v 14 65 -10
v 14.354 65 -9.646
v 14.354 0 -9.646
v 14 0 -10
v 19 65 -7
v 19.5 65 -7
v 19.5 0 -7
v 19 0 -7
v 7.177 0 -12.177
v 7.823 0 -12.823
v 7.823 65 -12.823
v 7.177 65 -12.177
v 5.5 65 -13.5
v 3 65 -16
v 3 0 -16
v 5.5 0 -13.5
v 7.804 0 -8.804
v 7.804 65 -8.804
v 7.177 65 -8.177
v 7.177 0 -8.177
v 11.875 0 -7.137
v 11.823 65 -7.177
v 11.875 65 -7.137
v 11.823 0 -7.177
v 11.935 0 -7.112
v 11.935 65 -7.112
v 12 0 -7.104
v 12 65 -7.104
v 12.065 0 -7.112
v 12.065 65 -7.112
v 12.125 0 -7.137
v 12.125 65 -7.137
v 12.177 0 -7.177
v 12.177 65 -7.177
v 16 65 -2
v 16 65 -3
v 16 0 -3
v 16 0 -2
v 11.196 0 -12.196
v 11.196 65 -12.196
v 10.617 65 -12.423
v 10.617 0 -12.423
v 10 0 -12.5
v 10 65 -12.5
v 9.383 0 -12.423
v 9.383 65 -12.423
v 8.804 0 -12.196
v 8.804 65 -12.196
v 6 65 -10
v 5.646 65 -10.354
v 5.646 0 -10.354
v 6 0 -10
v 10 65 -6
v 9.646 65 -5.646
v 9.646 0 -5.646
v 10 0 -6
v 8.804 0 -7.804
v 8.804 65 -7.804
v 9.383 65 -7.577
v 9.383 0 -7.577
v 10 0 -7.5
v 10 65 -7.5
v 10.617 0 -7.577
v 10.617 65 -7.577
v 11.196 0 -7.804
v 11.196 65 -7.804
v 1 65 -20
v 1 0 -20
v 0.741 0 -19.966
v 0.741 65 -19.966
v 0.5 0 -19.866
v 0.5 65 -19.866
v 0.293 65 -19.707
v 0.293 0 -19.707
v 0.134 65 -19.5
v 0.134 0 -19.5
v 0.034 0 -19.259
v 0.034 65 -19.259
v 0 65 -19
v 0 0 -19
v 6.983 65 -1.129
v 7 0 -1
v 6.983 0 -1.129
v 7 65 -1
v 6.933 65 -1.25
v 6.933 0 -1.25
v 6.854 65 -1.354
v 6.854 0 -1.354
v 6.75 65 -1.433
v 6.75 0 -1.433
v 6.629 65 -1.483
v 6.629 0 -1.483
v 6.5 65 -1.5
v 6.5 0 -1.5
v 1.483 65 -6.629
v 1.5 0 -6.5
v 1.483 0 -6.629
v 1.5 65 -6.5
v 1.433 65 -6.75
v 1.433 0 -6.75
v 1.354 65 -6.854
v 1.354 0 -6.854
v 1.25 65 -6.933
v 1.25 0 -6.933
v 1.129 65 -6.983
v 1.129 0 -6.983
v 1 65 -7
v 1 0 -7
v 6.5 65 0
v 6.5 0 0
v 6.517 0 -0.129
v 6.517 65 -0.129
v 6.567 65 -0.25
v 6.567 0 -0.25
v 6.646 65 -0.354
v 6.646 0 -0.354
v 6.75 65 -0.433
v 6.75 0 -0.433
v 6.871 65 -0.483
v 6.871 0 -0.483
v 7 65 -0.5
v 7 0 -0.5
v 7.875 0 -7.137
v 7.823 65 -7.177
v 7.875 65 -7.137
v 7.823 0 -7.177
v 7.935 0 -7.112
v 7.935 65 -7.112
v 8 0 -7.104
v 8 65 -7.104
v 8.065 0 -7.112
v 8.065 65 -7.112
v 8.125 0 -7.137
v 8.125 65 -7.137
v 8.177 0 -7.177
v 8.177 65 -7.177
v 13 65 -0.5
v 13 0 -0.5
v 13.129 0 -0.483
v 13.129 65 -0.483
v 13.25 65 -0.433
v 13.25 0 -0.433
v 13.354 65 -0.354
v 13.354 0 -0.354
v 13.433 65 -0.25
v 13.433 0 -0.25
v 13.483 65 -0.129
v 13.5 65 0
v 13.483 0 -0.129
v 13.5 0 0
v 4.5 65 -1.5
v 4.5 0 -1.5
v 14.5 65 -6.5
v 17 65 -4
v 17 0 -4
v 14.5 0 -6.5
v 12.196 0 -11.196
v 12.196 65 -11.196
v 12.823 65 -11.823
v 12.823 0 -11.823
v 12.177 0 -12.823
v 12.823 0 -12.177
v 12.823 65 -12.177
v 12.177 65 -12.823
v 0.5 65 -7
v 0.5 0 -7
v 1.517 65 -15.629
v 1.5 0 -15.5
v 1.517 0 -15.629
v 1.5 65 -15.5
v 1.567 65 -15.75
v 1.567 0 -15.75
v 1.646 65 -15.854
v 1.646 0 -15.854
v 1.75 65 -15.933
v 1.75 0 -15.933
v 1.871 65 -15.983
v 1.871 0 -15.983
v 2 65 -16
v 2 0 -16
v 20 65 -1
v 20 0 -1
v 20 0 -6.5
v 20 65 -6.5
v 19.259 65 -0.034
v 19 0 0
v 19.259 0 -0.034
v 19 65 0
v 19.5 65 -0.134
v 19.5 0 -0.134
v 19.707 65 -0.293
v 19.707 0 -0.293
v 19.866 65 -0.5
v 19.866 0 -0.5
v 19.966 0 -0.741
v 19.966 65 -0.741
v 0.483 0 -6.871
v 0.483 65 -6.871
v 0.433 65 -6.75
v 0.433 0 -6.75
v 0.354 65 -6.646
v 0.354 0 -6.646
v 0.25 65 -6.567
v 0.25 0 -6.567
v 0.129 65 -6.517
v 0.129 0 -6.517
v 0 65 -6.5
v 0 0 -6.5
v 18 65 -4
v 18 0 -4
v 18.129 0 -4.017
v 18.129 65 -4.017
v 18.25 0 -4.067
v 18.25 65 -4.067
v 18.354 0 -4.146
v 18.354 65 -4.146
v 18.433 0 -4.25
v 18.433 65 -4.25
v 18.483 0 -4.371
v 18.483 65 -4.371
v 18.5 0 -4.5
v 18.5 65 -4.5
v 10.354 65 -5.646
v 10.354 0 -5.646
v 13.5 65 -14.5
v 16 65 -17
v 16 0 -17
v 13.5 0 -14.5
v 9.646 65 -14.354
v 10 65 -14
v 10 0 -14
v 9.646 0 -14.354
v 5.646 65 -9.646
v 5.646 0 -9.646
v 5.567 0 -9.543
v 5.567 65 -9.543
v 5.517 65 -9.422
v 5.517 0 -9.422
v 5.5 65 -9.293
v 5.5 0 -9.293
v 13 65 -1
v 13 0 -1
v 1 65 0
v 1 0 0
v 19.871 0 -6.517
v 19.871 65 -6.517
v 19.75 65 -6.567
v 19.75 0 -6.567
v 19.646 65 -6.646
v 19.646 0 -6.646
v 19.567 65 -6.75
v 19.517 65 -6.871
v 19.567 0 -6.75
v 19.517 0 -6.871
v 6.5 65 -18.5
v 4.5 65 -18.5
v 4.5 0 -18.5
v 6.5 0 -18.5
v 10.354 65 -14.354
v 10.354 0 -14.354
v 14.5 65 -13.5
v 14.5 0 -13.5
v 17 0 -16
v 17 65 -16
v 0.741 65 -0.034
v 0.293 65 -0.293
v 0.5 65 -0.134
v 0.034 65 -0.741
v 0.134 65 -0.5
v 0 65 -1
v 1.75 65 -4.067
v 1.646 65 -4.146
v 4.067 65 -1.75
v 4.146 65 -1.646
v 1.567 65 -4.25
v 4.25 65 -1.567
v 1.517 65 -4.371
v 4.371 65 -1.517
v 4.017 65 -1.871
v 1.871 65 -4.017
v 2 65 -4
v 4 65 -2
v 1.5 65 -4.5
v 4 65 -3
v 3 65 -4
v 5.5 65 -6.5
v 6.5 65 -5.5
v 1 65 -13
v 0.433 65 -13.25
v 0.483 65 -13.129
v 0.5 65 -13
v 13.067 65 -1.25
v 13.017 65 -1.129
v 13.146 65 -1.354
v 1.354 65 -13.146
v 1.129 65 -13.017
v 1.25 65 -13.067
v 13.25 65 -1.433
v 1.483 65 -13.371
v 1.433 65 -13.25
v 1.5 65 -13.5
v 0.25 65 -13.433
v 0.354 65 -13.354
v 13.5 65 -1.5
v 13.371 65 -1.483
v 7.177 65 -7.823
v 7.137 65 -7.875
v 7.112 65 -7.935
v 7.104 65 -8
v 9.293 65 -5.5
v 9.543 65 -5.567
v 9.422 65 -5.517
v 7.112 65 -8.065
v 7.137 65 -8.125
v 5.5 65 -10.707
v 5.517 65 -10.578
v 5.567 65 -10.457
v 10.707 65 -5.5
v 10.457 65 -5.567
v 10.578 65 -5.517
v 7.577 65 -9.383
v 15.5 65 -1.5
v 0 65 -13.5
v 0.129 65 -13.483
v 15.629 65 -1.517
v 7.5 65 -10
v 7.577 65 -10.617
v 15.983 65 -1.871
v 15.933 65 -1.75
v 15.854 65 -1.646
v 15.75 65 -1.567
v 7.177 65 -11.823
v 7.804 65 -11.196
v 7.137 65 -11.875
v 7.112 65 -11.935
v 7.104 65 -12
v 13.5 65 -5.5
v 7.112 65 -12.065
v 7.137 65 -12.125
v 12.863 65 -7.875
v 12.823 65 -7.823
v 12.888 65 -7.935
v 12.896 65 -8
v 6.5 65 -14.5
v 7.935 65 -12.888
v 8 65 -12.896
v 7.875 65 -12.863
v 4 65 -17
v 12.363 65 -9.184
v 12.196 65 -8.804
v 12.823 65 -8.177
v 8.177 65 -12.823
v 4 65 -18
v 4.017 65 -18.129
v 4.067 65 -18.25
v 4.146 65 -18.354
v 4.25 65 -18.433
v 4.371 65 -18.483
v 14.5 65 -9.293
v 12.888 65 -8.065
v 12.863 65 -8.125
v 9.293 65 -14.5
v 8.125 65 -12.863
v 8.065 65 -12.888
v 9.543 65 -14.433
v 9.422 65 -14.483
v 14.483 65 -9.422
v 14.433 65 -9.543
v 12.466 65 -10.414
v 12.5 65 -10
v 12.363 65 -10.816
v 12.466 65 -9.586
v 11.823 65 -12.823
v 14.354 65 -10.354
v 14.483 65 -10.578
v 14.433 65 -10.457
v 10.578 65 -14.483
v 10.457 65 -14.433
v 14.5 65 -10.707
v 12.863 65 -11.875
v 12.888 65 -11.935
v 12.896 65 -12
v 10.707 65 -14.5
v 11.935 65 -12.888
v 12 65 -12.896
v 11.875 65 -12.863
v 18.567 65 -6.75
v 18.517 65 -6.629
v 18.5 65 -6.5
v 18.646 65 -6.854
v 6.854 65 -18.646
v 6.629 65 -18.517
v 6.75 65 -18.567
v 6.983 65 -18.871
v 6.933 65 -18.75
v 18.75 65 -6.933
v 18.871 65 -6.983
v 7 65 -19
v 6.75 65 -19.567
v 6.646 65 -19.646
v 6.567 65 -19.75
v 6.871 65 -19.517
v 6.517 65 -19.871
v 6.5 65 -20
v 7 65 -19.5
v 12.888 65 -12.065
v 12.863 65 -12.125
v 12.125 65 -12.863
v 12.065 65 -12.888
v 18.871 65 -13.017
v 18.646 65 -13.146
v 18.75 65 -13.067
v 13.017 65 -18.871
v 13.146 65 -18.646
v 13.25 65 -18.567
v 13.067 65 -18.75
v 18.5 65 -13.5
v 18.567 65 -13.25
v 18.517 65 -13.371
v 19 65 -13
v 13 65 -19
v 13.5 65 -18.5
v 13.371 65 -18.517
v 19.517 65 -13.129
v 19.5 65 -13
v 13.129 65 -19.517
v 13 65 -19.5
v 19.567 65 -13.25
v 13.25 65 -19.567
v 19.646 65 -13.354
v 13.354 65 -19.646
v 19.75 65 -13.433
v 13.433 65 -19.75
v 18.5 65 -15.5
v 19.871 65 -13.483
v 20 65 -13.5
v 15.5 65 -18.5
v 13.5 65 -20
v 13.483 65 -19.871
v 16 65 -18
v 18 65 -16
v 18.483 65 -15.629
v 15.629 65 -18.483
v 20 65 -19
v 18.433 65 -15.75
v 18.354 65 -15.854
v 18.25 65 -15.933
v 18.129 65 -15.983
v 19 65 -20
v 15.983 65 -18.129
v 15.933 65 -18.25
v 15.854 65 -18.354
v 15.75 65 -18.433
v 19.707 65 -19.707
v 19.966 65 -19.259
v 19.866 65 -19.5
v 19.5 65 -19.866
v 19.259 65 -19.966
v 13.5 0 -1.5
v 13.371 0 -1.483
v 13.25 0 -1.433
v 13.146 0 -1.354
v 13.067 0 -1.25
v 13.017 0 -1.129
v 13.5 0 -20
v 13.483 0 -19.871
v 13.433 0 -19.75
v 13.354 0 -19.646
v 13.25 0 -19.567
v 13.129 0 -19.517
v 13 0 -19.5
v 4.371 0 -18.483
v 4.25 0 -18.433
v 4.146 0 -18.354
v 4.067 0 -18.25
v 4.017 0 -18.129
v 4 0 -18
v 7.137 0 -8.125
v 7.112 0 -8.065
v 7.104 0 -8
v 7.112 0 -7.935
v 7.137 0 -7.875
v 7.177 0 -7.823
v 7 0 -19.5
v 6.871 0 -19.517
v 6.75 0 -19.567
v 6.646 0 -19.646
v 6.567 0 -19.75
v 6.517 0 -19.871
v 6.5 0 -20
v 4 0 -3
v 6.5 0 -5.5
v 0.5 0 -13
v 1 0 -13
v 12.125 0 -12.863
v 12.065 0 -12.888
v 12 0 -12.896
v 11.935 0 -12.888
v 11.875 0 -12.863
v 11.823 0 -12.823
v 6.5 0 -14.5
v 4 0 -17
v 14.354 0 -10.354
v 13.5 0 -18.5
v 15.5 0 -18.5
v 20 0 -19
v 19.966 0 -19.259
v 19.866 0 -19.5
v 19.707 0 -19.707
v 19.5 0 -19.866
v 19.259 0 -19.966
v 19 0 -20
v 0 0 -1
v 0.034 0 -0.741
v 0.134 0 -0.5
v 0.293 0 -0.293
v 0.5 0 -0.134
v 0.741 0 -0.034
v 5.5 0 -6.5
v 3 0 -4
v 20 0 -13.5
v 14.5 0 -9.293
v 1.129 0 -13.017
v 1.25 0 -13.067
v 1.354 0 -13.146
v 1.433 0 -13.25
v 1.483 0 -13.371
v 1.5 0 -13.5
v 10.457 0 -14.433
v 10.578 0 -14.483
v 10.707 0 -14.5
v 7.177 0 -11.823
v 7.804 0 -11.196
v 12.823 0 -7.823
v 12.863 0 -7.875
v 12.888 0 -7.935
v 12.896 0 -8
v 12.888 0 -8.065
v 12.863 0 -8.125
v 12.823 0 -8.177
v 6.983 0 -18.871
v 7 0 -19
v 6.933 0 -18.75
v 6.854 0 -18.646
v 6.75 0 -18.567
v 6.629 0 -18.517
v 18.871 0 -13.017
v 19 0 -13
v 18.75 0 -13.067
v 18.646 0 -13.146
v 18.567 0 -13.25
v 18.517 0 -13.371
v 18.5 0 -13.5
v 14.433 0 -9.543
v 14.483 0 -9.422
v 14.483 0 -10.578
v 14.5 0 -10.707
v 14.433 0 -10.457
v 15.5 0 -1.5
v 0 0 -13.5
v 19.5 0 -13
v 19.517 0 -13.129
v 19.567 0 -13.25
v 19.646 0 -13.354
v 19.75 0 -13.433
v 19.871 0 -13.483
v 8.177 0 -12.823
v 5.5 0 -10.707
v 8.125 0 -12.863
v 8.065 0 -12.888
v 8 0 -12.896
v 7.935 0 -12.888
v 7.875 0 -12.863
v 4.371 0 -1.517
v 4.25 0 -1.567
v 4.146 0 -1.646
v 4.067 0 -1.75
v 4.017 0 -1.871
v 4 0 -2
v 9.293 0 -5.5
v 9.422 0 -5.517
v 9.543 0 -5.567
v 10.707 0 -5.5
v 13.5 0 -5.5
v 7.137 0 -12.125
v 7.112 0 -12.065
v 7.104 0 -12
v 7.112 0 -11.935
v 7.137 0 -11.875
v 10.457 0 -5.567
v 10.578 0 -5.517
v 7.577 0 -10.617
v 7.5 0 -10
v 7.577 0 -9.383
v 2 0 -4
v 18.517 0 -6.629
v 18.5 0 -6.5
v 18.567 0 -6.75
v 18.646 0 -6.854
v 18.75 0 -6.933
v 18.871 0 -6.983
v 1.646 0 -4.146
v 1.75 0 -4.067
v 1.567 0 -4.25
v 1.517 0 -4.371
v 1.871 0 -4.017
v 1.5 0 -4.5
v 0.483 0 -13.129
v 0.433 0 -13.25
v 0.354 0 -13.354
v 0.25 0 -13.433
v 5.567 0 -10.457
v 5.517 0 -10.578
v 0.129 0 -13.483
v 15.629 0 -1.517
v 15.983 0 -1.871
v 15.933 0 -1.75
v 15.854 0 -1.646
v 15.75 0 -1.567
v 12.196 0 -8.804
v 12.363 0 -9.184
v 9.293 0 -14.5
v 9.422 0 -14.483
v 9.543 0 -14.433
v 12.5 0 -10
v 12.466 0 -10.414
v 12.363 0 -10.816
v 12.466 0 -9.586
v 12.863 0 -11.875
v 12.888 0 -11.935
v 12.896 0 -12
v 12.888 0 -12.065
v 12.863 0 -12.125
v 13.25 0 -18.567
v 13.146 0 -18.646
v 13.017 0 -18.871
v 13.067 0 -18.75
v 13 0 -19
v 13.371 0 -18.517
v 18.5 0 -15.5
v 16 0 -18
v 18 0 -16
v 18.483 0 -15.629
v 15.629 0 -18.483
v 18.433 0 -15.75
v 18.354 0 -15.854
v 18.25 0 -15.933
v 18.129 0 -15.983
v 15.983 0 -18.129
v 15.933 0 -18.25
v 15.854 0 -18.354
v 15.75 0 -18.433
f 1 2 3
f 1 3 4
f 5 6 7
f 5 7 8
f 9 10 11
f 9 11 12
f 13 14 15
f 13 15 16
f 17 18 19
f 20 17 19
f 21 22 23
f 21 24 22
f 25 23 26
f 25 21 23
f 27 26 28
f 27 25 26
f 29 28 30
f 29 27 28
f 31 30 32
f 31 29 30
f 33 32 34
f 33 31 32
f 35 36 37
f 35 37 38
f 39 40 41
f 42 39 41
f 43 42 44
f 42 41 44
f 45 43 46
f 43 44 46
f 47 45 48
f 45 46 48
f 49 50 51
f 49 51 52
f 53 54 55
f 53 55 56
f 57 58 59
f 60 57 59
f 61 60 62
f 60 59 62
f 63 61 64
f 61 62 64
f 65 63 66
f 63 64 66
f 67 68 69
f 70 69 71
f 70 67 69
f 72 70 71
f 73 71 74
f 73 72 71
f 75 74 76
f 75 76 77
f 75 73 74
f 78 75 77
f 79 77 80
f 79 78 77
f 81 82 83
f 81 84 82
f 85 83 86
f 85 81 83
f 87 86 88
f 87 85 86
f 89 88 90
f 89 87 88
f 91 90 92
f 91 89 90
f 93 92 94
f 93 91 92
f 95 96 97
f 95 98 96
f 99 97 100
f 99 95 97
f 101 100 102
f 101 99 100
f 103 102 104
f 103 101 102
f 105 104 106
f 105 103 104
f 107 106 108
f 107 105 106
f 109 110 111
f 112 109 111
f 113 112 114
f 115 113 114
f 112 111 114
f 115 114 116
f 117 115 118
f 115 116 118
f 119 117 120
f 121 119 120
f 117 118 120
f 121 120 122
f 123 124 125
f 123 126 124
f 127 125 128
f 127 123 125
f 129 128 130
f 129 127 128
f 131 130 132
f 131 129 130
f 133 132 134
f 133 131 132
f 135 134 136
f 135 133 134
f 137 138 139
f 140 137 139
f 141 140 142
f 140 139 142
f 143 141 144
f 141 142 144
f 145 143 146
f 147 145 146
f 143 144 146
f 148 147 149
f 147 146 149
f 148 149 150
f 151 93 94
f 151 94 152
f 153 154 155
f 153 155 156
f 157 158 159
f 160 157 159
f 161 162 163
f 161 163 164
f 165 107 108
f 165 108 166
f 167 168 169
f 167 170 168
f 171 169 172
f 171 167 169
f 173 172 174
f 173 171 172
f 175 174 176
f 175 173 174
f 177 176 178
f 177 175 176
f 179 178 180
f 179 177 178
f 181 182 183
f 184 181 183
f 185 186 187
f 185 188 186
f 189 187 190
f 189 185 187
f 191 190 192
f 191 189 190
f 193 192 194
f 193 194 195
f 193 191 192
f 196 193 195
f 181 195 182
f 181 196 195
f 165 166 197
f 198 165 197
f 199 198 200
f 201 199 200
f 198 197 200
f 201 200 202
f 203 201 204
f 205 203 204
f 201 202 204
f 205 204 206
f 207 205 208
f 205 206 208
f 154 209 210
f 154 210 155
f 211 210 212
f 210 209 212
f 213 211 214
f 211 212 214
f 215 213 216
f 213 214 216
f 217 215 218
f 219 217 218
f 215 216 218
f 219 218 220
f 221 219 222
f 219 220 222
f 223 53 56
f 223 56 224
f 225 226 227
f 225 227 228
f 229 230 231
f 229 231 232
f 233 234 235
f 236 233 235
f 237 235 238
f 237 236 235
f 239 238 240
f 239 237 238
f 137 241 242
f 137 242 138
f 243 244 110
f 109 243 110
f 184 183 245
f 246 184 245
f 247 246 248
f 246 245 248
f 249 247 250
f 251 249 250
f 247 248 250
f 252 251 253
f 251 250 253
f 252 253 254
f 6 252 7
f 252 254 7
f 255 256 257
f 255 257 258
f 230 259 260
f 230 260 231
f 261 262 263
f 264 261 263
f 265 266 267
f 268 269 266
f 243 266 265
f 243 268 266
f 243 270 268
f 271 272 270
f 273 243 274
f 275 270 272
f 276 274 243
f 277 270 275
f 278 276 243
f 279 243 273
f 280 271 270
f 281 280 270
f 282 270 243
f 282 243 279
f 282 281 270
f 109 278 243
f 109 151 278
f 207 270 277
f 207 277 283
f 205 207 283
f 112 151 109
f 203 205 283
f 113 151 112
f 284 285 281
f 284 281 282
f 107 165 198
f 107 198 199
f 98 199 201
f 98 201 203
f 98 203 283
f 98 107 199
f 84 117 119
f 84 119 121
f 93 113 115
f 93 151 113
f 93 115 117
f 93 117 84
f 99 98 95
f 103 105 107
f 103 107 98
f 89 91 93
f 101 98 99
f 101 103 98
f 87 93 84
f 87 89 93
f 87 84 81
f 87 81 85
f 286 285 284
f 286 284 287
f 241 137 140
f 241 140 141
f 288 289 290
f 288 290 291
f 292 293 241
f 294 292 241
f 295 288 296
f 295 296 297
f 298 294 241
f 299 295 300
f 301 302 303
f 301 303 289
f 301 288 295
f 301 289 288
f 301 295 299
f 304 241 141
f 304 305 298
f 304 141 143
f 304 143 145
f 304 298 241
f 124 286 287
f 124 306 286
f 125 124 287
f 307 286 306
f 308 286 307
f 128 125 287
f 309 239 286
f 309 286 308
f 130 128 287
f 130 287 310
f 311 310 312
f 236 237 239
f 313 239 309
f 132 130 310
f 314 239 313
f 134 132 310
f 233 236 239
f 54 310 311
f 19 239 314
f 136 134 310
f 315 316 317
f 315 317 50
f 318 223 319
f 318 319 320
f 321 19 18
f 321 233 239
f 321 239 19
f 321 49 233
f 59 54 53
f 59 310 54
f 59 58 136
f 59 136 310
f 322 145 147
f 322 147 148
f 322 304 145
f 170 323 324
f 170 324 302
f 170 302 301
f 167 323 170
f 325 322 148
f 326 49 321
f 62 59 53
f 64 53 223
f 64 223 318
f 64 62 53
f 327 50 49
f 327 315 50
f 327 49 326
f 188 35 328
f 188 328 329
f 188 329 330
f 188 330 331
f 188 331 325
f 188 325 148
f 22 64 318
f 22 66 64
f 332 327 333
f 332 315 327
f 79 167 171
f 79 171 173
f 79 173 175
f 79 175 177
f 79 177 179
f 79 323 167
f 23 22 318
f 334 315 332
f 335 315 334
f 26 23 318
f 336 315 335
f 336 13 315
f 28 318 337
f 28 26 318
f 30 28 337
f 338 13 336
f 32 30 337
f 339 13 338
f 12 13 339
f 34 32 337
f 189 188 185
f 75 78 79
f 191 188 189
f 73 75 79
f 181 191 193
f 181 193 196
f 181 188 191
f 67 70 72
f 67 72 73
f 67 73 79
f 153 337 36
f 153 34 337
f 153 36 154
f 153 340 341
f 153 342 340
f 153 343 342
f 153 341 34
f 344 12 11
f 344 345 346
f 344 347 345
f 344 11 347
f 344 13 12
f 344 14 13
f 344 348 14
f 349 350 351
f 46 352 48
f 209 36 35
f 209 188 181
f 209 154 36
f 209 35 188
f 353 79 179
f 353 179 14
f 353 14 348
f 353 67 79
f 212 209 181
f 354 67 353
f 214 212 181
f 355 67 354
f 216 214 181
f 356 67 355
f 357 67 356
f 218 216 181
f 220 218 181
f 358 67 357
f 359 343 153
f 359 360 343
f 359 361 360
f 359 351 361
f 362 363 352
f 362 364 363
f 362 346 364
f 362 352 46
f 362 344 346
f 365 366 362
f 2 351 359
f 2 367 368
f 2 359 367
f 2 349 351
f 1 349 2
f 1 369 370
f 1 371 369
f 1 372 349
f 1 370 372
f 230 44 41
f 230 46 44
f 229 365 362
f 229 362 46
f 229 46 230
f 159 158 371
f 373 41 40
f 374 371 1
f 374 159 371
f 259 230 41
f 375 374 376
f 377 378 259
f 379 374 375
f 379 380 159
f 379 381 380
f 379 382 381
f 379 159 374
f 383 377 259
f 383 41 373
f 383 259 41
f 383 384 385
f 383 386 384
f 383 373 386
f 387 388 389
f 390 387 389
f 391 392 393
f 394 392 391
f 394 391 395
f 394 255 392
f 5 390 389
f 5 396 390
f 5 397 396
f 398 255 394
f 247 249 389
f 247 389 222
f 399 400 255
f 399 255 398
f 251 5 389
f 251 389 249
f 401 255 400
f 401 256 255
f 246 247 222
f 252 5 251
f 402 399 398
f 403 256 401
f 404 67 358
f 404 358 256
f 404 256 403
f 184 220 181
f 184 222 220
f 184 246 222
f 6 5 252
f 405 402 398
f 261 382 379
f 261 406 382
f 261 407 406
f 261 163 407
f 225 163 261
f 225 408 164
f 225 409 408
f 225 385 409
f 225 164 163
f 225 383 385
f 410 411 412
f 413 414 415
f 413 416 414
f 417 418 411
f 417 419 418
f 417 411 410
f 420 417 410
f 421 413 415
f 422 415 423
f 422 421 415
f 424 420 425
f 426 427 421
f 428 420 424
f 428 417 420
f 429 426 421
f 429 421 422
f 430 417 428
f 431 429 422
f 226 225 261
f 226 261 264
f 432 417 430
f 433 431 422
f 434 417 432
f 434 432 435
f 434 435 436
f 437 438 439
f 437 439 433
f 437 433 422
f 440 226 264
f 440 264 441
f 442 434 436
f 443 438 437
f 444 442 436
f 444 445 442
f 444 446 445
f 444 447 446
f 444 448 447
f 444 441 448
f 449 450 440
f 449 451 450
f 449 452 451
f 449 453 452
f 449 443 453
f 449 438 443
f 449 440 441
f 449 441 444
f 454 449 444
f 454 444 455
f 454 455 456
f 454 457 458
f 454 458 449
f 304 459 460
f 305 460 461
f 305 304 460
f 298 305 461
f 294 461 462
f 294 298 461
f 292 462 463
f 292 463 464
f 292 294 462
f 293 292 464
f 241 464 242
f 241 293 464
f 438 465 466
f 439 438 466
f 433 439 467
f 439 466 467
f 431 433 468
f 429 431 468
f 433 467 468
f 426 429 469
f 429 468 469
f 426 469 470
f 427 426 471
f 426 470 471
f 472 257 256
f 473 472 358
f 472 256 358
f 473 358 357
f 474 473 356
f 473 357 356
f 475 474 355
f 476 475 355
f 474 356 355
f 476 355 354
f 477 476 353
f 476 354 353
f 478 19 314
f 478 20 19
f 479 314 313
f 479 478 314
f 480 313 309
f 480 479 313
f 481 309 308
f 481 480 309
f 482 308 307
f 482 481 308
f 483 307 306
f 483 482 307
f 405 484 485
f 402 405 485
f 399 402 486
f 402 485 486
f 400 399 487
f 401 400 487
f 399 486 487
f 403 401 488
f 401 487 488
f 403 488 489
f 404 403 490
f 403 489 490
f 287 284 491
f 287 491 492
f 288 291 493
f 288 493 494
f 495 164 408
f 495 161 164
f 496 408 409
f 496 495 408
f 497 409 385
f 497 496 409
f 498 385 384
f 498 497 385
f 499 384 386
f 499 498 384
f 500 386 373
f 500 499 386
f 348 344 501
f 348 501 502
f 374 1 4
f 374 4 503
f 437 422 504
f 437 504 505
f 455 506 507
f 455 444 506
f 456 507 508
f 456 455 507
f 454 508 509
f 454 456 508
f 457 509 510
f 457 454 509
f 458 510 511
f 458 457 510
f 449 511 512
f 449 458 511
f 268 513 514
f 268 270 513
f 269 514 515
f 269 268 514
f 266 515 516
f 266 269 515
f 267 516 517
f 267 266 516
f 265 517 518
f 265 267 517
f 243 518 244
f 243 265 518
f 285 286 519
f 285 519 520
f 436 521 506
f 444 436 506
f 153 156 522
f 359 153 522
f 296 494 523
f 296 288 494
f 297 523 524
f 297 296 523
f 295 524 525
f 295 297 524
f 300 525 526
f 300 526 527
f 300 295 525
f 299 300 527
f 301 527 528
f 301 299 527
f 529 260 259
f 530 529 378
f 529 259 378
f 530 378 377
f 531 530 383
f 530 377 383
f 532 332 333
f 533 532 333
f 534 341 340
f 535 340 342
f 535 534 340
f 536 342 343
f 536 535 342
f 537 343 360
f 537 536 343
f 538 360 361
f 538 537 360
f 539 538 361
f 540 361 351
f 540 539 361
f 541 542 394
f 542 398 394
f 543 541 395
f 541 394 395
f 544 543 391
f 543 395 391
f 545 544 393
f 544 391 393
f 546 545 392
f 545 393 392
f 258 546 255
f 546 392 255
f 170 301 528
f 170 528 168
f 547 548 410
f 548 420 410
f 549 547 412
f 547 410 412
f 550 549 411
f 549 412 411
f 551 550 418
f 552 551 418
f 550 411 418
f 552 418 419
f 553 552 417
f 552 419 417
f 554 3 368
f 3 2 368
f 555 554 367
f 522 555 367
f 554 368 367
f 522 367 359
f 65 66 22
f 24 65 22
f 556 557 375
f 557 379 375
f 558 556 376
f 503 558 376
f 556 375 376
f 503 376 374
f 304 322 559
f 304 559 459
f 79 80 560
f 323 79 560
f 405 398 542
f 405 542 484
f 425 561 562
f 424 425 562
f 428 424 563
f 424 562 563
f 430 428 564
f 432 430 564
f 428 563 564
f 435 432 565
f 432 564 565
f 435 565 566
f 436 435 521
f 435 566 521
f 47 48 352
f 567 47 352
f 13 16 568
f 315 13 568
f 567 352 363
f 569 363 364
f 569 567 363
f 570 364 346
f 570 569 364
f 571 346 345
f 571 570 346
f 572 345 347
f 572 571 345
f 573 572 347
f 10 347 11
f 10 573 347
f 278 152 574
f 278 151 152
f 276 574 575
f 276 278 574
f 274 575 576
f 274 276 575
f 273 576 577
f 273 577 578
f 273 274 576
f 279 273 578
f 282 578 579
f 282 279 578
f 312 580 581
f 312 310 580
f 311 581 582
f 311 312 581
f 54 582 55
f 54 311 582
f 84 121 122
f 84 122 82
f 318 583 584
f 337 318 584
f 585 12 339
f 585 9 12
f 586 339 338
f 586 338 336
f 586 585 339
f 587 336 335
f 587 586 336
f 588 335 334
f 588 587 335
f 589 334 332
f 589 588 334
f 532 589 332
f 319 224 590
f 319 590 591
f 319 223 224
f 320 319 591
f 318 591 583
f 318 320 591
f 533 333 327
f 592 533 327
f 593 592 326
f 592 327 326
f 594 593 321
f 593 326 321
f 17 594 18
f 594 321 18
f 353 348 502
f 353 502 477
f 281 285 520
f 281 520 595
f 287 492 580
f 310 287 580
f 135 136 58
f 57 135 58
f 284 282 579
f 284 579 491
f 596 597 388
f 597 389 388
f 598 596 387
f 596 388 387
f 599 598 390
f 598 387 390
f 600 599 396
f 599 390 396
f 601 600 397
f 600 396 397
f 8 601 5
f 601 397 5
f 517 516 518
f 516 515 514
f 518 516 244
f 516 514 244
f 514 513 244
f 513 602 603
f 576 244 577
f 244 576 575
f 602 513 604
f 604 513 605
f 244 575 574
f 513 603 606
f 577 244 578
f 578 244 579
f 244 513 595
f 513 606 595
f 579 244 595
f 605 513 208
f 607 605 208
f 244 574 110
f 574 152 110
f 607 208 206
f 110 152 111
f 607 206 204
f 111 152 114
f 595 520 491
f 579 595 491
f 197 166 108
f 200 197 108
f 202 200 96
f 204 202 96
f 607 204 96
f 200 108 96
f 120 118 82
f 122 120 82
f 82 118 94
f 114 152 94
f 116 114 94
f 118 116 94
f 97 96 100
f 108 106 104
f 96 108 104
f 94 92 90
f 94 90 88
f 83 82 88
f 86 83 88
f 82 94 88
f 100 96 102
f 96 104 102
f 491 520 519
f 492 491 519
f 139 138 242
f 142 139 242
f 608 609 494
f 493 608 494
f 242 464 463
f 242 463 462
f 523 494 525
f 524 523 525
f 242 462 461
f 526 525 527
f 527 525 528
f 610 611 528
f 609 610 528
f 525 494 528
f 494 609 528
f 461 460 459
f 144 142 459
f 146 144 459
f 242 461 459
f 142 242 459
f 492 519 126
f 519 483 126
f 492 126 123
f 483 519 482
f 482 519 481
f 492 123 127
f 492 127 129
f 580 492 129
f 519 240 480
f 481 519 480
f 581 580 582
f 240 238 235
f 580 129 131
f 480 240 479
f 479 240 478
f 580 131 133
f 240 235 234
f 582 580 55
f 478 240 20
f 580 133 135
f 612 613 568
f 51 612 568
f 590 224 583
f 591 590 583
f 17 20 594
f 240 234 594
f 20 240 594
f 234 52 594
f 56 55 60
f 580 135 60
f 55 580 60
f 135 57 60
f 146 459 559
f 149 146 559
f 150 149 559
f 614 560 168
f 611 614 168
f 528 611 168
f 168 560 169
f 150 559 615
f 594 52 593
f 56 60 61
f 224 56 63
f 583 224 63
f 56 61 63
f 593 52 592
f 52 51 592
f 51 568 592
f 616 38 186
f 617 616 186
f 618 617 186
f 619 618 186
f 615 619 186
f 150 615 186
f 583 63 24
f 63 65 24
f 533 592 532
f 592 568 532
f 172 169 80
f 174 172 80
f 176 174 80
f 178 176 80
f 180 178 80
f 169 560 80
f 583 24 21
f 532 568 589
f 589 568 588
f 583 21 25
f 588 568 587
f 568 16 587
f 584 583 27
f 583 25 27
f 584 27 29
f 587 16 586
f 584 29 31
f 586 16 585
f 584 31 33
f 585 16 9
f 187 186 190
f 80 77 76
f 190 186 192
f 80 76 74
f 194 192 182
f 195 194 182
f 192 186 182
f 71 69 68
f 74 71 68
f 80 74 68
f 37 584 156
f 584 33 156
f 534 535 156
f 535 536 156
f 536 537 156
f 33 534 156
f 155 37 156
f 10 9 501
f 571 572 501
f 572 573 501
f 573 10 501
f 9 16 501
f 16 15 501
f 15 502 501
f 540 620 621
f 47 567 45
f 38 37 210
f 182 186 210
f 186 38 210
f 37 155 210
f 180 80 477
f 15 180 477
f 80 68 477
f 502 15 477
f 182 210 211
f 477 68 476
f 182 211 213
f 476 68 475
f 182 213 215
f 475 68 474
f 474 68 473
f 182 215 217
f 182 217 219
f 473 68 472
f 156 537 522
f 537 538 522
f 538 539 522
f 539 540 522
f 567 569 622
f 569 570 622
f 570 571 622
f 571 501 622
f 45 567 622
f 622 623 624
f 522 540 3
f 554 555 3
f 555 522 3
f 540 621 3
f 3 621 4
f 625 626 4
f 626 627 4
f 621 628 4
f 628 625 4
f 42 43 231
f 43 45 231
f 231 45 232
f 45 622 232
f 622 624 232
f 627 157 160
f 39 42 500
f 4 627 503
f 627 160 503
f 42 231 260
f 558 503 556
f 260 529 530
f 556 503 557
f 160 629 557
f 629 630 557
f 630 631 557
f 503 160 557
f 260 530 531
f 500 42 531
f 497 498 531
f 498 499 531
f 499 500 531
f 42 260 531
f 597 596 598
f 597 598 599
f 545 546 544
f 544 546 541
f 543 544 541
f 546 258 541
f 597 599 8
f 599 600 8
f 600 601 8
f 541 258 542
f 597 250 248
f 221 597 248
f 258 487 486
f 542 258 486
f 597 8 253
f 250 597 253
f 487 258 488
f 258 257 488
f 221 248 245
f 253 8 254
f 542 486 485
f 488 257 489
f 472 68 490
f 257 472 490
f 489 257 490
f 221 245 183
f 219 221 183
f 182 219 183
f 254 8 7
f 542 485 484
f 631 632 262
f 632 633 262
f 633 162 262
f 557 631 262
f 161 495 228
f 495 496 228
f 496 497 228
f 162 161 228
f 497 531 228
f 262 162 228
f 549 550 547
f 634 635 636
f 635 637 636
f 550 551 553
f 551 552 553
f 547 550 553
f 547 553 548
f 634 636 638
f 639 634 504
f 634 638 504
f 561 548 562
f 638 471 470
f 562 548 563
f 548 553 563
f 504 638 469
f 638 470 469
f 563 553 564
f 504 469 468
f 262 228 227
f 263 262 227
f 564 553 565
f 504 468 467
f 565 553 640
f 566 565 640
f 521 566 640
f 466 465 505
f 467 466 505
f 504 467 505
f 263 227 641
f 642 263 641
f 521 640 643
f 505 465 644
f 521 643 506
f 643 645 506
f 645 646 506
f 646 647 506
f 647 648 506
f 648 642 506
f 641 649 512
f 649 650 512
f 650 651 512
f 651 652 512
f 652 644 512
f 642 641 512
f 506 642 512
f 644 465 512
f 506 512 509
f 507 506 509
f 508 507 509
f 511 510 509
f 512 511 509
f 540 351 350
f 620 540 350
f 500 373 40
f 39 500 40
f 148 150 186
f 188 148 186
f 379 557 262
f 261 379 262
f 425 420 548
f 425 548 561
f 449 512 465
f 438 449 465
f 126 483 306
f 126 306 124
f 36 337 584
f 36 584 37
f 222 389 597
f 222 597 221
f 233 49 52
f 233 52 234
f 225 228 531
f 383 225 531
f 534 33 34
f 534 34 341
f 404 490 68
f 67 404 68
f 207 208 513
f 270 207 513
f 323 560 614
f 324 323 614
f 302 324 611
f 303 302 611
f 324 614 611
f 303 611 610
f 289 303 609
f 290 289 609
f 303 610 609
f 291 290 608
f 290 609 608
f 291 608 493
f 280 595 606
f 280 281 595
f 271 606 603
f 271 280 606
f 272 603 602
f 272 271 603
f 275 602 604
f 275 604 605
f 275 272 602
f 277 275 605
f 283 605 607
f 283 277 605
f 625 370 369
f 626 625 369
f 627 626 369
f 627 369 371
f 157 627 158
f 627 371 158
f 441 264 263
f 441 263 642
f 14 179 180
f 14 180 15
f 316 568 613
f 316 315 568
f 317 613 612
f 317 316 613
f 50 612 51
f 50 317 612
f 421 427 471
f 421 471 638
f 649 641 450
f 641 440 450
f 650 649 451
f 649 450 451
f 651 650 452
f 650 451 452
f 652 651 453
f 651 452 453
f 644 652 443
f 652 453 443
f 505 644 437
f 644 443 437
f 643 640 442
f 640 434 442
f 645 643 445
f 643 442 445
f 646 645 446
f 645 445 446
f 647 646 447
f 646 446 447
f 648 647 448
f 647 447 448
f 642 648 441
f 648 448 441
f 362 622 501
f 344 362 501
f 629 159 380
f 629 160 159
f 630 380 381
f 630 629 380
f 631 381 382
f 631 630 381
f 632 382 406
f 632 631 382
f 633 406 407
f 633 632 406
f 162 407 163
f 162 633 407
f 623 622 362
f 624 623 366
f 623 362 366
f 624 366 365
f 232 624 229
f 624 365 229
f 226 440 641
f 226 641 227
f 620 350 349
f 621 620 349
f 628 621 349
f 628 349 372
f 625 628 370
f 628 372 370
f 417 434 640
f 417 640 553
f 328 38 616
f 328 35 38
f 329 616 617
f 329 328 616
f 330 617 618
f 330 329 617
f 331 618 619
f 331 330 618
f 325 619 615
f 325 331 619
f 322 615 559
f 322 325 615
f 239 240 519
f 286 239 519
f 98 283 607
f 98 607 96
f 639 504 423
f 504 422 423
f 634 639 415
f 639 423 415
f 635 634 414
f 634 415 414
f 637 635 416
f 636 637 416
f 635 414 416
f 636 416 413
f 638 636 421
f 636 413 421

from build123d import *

# Parameters (mm, degrees)
BOSS_EXTRUDE1_DEPTH = 65
FILLET1_R           = 1
CUT_EXTRUDE1_DEPTH  = 66
FILLET2_R           = 0.5
FILLET3_R           = 0.25


with BuildPart() as part:
    # Sketch3 → Boss-Extrude1 (new body)
    with BuildSketch(Plane(origin=(0, 0, 0), x_dir=(1, 0, 0), z_dir=(0, 1, 0))):
        with BuildLine():
            Line((7, 18.5), (7, 19.5))
            ThreePointArc((7, 19.5), (6.646446609, 19.646446609), (6.5, 20))
            Line((6.5, 20), (0, 20))
            Line((0, 20), (0, 13.5))
            ThreePointArc((0, 13.5), (0.353553391, 13.353553391), (0.5, 13))
            Line((0.5, 13), (1.5, 13))
            Line((1.5, 13), (1.5, 16))
            Line((1.5, 16), (3, 16))
            Line((3, 16), (5.5, 13.5))
            Line((5.5, 13.5), (5.5, 10.5))
            Line((5.5, 10.5), (6, 10))
            Line((6, 10), (5.5, 9.5))
            Line((5.5, 9.5), (5.5, 6.5))
            Line((5.5, 6.5), (3, 4))
            Line((3, 4), (1.5, 4))
            Line((1.5, 4), (1.5, 7))
            Line((1.5, 7), (0.5, 7))
            ThreePointArc((0.5, 7), (0.353553391, 6.646446609), (0, 6.5))
            Line((0, 6.5), (0, 0))
            Line((0, 0), (6.5, 0))
            ThreePointArc((6.5, 0), (6.646446609, 0.353553391), (7, 0.5))
            Line((7, 0.5), (7, 1.5))
            Line((7, 1.5), (4, 1.5))
            Line((4, 1.5), (4, 3))
            Line((4, 3), (6.5, 5.5))
            Line((6.5, 5.5), (9.5, 5.5))
            Line((9.5, 5.5), (10, 6))
            Line((10, 6), (10.5, 5.5))
            Line((10.5, 5.5), (13.5, 5.5))
            Line((13.5, 5.5), (16, 3))
            Line((16, 3), (16, 1.5))
            Line((16, 1.5), (13, 1.5))
            Line((13, 1.5), (13, 0.5))
            ThreePointArc((13, 0.5), (13.353553391, 0.353553391), (13.5, 0))
            Line((13.5, 0), (20, 0))
            Line((20, 0), (20, 6.5))
            ThreePointArc((20, 6.5), (19.646446609, 6.646446609), (19.5, 7))
            Line((19.5, 7), (18.5, 7))
            Line((18.5, 7), (18.5, 4))
            Line((18.5, 4), (17, 4))
            Line((17, 4), (14.5, 6.5))
            Line((14.5, 6.5), (14.5, 9.5))
            Line((14.5, 9.5), (14, 10))
            Line((14, 10), (14.5, 10.5))
            Line((14.5, 10.5), (14.5, 13.5))
            Line((14.5, 13.5), (17, 16))
            Line((17, 16), (18.5, 16))
            Line((18.5, 16), (18.5, 13))
            Line((18.5, 13), (19.5, 13))
            ThreePointArc((19.5, 13), (19.646446609, 13.353553391), (20, 13.5))
            Line((20, 13.5), (20, 20))
            Line((20, 20), (13.5, 20))
            ThreePointArc((13.5, 20), (13.353553391, 19.646446609), (13, 19.5))
            Line((13, 19.5), (13, 18.5))
            Line((13, 18.5), (16, 18.5))
            Line((16, 18.5), (16, 17))
            Line((16, 17), (13.5, 14.5))
            Line((13.5, 14.5), (10.5, 14.5))
            Line((10.5, 14.5), (10, 14))
            Line((10, 14), (9.5, 14.5))
            Line((9.5, 14.5), (6.5, 14.5))
            Line((6.5, 14.5), (4, 17))
            Line((4, 17), (4, 18.5))
            Line((4, 18.5), (7, 18.5))
        make_face()
    extrude(amount=BOSS_EXTRUDE1_DEPTH)

    # Fillet1
    fillet1_edges = [part.edges().sort_by_distance(p)[0] for p in [
        (20, 32.5, 0),
        (0, 32.5, 0),
        (0, 32.5, -20),
        (20, 32.5, -20),
    ]]
    fillet(fillet1_edges, radius=FILLET1_R)

    # Sketch4 → Cut-Extrude1 (cut, through all)
    with BuildSketch(Plane(origin=(0, 65, 0), x_dir=(1, 0, 0), z_dir=(0, 1, 0))):
        with BuildLine():
            Line((10, 11), (11.195582496, 12.195582496))
            ThreePointArc((11.195582496, 12.195582496), (10, 12.5), (8.804417504, 12.195582496))
            Line((8.804417504, 12.195582496), (10, 11))
        make_face()
        with BuildLine():
            ThreePointArc((12.195582496, 11.195582496), (11.767766953, 11.767766953), (11.195582496, 12.195582496))
            Line((11.195582496, 12.195582496), (10, 11))
            Line((10, 11), (11, 10))
            Line((11, 10), (12.195582496, 11.195582496))
        make_face()
        with BuildLine():
            Line((9, 10), (10, 11))
            Line((10, 11), (8.804417504, 12.195582496))
            ThreePointArc((8.804417504, 12.195582496), (8.232233047, 11.767766953), (7.804417504, 11.195582496))
            Line((7.804417504, 11.195582496), (9, 10))
        make_face()
        Polygon((11, 10), (10, 11), (9, 10), (10, 9), align=None)
        with BuildLine():
            Line((7.804417504, 8.804417504), (9, 10))
            Line((9, 10), (7.804417504, 11.195582496))
            ThreePointArc((7.804417504, 11.195582496), (7.5, 10), (7.804417504, 8.804417504))
        make_face()
        with BuildLine():
            Line((10, 9), (9, 10))
            Line((9, 10), (7.804417504, 8.804417504))
            ThreePointArc((7.804417504, 8.804417504), (8.232233047, 8.232233047), (8.804417504, 7.804417504))
            Line((8.804417504, 7.804417504), (10, 9))
        make_face()
        with BuildLine():
            Line((11.195582496, 7.804417504), (10, 9))
            Line((10, 9), (8.804417504, 7.804417504))
            ThreePointArc((8.804417504, 7.804417504), (10, 7.5), (11.195582496, 7.804417504))
        make_face()
        with BuildLine():
            Line((12.195582496, 8.804417504), (11, 10))
            Line((11, 10), (10, 9))
            Line((10, 9), (11.195582496, 7.804417504))
            ThreePointArc((11.195582496, 7.804417504), (11.767766953, 8.232233047), (12.195582496, 8.804417504))
        make_face()
        with BuildLine():
            ThreePointArc((12.5, 10), (12.422700584, 10.616864556), (12.195582496, 11.195582496))
            Line((12.195582496, 11.195582496), (11, 10))
            Line((11, 10), (12.195582496, 8.804417504))
            ThreePointArc((12.195582496, 8.804417504), (12.422700584, 9.383135444), (12.5, 10))
        make_face()
        with BuildLine():
            ThreePointArc((8.804417504, 7.804417504), (8.232233047, 8.232233047), (7.804417504, 8.804417504))
            Line((7.804417504, 8.804417504), (7, 8))
            Line((7, 8), (8, 7))
            Line((8, 7), (8.804417504, 7.804417504))
        make_face()
        with BuildLine():
            Line((13, 8), (12.195582496, 8.804417504))
            ThreePointArc((12.195582496, 8.804417504), (11.767766953, 8.232233047), (11.195582496, 7.804417504))
            Line((11.195582496, 7.804417504), (12, 7))
            Line((12, 7), (13, 8))
        make_face()
        with BuildLine():
            Line((13, 12), (12, 13))
            Line((12, 13), (11.195582496, 12.195582496))
            ThreePointArc((11.195582496, 12.195582496), (11.767766953, 11.767766953), (12.195582496, 11.195582496))
            Line((12.195582496, 11.195582496), (13, 12))
        make_face()
        with BuildLine():
            ThreePointArc((7.804417504, 11.195582496), (8.232233047, 11.767766953), (8.804417504, 12.195582496))
            Line((8.804417504, 12.195582496), (8, 13))
            Line((8, 13), (7, 12))
            Line((7, 12), (7.804417504, 11.195582496))
        make_face()
    extrude(amount=-CUT_EXTRUDE1_DEPTH, mode=Mode.SUBTRACT)

    # Fillet2
    fillet2_edges = [part.edges().sort_by_distance(p)[0] for p in [
        (18.5, 32.5, -13),
        (18.5, 32.5, -16),
        (14.5, 32.5, -10.5),
        (14.5, 32.5, -9.5),
        (18.5, 32.5, -4),
        (18.5, 32.5, -7),
        (13, 32.5, -1.5),
        (16, 32.5, -1.5),
        (10.5, 32.5, -5.5),
        (9.5, 32.5, -5.5),
        (4, 32.5, -1.5),
        (7, 32.5, -1.5),
        (1.5, 32.5, -7),
        (1.5, 32.5, -4),
        (5.5, 32.5, -9.5),
        (5.5, 32.5, -10.5),
        (1.5, 32.5, -16),
        (1.5, 32.5, -13),
        (7, 32.5, -18.5),
        (4, 32.5, -18.5),
        (9.5, 32.5, -14.5),
        (10.5, 32.5, -14.5),
        (16, 32.5, -18.5),
        (13, 32.5, -18.5),
    ]]
    fillet(fillet2_edges, radius=FILLET2_R)

    # Fillet3
    fillet3_edges = [part.edges().sort_by_distance(p)[0] for p in [
        (7, 32.5, -12),
        (8, 32.5, -13),
        (12, 32.5, -13),
        (13, 32.5, -12),
        (13, 32.5, -8),
        (12, 32.5, -7),
        (8, 32.5, -7),
        (7, 32.5, -8),
    ]]
    fillet(fillet3_edges, radius=FILLET3_R)


solid = part.part
